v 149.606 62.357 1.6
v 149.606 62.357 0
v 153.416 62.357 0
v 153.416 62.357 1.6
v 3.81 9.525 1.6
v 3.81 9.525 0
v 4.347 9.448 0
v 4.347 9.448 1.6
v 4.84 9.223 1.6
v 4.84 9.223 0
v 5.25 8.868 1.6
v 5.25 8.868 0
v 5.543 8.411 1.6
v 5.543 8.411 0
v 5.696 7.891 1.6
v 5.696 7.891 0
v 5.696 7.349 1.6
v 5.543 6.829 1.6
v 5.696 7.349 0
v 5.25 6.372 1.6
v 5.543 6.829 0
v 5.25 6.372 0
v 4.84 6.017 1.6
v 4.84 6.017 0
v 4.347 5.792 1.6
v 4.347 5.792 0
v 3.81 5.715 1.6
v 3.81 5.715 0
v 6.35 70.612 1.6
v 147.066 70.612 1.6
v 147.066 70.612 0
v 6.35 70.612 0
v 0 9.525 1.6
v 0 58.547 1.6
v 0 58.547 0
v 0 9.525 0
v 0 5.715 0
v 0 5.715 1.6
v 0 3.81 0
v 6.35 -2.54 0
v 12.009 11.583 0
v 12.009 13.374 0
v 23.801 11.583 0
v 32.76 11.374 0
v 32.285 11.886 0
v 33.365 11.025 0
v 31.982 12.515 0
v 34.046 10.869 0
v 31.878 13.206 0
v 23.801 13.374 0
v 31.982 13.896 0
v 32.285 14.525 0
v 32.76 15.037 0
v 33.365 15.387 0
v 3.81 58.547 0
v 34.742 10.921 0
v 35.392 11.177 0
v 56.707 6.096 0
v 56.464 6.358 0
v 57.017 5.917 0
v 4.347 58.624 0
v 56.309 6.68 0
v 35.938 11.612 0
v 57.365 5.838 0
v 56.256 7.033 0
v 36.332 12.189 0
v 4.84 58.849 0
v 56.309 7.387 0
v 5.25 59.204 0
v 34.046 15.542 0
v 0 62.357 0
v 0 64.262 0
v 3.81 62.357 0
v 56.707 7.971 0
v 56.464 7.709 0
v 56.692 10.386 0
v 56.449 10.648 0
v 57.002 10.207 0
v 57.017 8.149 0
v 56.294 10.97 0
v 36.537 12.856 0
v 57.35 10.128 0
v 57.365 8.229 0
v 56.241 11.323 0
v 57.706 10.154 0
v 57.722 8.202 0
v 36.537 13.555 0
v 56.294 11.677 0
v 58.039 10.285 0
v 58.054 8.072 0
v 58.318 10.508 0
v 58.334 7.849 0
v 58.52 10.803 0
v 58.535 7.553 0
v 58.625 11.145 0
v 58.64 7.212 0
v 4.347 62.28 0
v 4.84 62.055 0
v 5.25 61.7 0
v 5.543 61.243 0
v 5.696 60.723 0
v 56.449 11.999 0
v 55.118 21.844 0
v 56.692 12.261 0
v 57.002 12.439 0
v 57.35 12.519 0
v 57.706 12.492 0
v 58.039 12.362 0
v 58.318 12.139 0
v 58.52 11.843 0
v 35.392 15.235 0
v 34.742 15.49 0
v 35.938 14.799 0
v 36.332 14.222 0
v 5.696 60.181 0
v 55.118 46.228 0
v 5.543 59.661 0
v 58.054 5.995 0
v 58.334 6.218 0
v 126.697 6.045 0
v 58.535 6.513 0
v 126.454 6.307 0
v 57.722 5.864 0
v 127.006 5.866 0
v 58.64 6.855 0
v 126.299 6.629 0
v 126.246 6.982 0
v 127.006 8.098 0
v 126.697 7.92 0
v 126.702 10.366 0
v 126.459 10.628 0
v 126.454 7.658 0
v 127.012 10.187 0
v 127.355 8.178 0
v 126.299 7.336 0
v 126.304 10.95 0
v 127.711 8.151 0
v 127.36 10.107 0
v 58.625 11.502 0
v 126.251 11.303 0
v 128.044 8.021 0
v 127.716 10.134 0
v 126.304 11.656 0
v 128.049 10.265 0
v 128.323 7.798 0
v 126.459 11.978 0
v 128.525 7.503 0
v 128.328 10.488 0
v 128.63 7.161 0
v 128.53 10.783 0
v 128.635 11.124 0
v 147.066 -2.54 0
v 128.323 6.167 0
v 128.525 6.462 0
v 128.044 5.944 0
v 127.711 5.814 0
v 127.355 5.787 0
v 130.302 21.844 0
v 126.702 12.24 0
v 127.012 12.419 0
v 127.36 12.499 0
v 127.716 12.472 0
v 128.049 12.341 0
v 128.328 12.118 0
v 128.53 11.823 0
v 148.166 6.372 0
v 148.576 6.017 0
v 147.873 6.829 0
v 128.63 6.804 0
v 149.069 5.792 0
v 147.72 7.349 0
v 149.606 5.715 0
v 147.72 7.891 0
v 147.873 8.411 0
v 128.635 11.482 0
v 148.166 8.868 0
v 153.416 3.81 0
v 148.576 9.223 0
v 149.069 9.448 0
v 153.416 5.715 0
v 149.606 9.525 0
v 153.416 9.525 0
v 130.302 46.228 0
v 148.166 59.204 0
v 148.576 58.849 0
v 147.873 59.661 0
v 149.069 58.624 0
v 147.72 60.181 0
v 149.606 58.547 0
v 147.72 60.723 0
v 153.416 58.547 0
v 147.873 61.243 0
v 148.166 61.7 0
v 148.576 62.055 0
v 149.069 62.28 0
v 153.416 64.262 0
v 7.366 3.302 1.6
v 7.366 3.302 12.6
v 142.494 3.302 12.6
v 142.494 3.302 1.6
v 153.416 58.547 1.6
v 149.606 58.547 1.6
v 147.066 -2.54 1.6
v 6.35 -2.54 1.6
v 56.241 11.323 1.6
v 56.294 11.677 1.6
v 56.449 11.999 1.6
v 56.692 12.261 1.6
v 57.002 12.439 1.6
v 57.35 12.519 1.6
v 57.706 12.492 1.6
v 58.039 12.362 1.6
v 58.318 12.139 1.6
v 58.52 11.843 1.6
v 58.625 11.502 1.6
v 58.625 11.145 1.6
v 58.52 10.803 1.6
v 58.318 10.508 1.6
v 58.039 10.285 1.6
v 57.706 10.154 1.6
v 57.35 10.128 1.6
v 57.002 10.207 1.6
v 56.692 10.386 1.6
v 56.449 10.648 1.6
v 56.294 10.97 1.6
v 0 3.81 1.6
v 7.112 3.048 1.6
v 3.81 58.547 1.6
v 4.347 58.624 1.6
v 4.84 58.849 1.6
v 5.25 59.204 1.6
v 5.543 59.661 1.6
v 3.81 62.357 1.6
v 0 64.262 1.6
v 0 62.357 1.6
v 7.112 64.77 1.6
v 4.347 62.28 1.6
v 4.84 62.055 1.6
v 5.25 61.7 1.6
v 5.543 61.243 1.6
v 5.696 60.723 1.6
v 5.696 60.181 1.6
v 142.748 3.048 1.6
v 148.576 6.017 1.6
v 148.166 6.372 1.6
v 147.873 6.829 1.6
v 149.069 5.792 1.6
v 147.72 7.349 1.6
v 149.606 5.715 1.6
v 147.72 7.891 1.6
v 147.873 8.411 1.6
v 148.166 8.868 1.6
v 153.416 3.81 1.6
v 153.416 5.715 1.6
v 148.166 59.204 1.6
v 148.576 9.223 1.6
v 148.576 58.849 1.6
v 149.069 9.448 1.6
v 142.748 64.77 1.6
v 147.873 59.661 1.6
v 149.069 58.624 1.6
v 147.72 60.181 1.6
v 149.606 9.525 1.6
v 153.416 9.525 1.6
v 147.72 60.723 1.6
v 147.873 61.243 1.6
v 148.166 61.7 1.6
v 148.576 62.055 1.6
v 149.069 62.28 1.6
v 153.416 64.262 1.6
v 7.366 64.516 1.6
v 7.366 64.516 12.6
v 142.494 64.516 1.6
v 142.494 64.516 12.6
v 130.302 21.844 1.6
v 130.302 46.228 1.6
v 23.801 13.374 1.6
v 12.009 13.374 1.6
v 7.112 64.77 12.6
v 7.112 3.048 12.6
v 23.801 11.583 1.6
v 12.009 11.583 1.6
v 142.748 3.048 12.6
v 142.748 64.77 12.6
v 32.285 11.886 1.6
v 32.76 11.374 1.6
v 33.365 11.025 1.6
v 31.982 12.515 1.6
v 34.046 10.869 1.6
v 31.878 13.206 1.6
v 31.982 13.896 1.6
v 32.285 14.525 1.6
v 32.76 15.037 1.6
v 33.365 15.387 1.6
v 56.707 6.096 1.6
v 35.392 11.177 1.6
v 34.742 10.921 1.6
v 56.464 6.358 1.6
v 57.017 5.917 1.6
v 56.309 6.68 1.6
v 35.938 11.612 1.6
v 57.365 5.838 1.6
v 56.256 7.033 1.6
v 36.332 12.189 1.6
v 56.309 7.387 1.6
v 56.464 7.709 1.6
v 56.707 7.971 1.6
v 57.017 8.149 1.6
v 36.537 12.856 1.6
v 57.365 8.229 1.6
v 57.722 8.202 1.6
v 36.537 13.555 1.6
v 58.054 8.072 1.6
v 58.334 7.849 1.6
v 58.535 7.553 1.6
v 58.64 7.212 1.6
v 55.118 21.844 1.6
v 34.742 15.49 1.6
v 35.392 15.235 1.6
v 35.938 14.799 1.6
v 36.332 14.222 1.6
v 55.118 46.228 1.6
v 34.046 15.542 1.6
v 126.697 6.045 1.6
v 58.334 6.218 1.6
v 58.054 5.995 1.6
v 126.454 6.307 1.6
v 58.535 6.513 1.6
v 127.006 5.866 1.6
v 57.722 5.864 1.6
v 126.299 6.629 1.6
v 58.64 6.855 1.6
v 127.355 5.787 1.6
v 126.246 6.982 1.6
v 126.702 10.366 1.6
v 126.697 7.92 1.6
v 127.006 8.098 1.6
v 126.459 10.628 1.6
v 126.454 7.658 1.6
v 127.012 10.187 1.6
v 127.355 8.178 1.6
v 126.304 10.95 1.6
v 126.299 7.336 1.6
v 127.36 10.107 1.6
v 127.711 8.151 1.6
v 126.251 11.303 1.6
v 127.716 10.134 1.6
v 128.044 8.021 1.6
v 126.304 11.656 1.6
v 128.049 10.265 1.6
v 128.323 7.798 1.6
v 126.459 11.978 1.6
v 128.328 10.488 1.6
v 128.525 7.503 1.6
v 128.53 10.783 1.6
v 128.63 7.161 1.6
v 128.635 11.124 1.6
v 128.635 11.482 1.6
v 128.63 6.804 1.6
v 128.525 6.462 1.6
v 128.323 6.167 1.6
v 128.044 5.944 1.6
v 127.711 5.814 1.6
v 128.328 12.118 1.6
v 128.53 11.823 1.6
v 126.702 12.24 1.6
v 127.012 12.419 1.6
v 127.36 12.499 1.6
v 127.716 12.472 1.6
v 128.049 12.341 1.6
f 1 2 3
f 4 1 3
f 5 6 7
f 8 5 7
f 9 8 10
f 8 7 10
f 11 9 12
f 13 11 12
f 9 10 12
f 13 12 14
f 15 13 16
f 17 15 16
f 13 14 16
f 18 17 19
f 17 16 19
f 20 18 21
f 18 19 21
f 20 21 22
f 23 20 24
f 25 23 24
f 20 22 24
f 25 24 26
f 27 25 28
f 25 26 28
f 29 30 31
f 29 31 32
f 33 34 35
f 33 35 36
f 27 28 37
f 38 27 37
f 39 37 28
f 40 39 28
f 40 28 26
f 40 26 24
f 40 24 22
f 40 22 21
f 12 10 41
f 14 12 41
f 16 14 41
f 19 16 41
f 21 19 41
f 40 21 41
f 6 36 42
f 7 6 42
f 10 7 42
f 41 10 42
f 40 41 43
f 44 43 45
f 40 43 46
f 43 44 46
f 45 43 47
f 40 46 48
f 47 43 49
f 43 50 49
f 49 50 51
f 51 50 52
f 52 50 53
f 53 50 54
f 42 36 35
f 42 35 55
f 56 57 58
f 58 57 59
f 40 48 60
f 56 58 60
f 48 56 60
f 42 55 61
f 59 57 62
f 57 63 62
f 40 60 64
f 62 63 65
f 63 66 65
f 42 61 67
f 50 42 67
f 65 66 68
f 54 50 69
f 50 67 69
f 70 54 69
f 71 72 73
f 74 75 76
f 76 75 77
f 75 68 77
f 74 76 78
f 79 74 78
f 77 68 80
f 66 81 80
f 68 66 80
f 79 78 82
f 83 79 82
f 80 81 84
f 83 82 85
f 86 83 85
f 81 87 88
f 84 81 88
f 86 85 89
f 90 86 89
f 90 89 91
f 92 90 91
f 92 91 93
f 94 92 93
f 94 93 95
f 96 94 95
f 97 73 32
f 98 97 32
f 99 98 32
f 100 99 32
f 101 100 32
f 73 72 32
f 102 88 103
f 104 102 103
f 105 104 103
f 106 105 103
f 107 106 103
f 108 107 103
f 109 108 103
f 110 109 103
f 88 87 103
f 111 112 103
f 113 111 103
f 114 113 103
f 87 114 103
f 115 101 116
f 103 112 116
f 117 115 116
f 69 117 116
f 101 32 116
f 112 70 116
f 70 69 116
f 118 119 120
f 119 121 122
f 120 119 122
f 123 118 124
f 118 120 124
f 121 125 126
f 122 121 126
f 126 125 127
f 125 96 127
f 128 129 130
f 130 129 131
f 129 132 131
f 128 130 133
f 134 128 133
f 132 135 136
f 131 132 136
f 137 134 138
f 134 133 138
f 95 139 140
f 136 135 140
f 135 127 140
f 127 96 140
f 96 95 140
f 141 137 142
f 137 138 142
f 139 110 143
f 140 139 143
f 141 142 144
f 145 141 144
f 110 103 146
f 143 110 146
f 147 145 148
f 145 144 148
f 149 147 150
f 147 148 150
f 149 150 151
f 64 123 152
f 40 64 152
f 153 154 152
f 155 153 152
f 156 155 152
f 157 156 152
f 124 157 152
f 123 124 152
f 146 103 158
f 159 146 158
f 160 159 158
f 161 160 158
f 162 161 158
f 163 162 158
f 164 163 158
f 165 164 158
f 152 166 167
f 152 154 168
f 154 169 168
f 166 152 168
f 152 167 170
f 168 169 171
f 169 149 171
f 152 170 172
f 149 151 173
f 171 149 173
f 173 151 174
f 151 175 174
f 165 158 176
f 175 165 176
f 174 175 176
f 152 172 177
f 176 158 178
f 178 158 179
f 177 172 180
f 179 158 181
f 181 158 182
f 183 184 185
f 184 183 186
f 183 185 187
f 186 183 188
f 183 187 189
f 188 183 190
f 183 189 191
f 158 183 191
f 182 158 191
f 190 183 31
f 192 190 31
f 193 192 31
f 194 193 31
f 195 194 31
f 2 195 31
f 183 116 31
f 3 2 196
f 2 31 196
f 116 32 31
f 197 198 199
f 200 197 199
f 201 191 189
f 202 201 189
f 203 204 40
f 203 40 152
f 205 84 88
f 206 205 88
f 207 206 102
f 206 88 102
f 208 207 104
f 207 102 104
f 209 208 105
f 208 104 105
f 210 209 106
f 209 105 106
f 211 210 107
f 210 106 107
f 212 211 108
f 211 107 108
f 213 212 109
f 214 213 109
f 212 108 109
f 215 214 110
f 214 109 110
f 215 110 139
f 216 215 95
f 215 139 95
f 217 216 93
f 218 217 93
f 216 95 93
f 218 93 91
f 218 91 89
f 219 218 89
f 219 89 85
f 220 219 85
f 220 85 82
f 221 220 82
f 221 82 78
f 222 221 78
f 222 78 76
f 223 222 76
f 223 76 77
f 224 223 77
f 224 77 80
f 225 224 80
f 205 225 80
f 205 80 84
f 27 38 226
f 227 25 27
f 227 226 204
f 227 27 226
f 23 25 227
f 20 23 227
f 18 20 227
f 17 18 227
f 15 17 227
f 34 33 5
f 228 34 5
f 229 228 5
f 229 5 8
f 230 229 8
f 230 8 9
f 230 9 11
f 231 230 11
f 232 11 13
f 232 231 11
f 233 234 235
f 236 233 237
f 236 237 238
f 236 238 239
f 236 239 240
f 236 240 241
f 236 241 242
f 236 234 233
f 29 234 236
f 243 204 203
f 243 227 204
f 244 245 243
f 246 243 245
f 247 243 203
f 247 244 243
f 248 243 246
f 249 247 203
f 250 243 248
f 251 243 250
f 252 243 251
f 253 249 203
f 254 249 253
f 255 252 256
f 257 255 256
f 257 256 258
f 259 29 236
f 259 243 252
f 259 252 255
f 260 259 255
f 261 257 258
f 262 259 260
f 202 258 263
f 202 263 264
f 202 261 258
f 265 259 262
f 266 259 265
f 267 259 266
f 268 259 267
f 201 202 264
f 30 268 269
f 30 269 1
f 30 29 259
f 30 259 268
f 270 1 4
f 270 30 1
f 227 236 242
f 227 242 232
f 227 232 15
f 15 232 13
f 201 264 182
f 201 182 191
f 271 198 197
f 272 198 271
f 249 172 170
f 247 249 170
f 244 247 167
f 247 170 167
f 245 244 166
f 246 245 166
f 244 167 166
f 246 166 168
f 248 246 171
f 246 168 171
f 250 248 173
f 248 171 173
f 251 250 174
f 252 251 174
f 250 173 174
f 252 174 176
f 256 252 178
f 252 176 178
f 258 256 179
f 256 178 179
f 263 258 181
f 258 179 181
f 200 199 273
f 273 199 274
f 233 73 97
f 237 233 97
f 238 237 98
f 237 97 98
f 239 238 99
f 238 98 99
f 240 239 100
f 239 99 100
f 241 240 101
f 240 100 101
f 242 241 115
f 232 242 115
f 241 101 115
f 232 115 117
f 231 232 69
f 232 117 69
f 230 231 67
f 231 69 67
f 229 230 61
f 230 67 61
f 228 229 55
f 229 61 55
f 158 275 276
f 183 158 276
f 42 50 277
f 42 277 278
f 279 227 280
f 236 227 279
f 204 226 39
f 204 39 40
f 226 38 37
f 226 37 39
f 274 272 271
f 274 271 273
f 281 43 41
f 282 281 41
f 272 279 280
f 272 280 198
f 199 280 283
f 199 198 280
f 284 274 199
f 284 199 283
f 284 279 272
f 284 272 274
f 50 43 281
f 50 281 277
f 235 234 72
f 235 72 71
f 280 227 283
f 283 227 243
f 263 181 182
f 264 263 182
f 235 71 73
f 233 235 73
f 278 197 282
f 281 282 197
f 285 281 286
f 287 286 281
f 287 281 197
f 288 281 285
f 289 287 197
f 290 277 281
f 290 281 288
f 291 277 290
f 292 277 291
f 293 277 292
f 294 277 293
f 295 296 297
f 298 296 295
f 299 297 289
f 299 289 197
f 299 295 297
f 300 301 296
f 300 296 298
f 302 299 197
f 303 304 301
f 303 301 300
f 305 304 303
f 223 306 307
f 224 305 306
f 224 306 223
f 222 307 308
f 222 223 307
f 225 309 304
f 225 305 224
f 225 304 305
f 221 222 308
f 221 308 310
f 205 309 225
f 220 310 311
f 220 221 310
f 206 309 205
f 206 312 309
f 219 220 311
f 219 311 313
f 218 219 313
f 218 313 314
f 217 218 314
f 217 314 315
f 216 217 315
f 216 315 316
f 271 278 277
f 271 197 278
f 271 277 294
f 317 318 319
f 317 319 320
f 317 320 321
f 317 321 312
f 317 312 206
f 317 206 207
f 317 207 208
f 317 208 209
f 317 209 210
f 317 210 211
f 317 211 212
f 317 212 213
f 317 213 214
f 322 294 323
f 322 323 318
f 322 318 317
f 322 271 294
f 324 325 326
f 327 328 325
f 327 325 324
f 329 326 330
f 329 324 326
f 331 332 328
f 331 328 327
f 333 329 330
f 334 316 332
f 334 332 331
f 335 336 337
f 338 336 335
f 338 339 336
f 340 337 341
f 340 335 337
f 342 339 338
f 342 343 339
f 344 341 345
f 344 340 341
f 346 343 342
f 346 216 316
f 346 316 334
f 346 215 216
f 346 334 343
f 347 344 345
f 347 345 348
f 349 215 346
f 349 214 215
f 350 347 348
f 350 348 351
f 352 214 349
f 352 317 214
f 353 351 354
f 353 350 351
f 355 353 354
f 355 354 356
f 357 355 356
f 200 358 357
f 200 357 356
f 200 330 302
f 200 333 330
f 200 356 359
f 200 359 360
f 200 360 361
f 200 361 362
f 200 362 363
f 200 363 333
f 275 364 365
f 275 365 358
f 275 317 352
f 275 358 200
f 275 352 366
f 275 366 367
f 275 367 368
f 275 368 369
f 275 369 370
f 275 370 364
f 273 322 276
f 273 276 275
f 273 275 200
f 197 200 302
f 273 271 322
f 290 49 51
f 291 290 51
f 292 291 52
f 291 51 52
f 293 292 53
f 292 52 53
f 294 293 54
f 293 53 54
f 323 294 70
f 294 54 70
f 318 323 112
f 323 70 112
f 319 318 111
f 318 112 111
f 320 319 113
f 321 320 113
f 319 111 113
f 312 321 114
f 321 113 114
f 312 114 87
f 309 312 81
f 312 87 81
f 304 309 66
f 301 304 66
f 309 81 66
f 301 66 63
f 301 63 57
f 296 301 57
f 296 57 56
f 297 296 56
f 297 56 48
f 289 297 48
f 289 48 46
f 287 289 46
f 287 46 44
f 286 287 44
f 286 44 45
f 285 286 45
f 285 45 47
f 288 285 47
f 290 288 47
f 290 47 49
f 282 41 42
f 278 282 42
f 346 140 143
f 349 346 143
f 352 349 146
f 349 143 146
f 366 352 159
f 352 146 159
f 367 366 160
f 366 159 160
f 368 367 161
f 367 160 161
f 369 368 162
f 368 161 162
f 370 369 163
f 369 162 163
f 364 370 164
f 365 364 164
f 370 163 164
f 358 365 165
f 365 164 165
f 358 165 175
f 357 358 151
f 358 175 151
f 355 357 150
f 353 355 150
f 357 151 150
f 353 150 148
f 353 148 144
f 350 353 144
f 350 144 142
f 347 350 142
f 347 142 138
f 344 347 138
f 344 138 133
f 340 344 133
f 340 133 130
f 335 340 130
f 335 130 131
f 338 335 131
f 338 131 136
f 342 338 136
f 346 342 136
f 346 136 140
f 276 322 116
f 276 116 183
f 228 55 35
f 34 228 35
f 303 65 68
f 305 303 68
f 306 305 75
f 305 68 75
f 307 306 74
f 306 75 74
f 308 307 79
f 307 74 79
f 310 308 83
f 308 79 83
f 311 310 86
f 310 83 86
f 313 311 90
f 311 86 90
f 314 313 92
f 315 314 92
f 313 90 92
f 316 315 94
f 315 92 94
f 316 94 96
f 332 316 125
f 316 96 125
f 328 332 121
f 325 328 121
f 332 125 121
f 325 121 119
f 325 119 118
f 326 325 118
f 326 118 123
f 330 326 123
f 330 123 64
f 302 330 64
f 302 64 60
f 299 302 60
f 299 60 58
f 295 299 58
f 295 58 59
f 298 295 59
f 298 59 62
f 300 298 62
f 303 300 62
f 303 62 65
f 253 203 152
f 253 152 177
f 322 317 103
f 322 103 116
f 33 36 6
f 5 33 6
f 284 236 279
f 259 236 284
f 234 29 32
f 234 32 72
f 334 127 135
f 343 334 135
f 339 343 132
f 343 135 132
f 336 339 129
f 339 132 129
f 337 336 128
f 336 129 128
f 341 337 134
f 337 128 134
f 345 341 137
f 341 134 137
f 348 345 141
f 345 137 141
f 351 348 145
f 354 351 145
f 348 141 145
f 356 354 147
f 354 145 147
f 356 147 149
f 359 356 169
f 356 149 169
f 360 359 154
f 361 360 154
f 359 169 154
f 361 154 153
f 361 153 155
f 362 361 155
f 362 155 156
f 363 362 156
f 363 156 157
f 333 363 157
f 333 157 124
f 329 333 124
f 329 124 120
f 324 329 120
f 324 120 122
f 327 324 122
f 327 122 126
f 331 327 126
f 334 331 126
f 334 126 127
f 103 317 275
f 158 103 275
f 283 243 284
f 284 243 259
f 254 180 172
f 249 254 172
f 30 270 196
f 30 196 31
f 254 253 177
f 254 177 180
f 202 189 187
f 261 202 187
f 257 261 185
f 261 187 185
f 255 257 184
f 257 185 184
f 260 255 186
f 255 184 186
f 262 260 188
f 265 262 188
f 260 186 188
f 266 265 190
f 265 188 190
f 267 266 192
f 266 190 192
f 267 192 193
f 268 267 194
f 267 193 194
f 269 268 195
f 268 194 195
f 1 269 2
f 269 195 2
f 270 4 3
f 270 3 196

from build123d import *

# Parameters (mm, degrees)
BOSS_EXTRUDE1_DEPTH      = 1.6002
CUT_EXTRUDE1_DEPTH       = 2.6002
CUT_EXTRUDE2_DEPTH       = 2.6002
CUT_EXTRUDE3_DEPTH       = 2.6002
CUT_EXTRUDE4_DEPTH       = 2.6002
SKETCH6_W                = 135.636
SKETCH6_H                = 61.722
BOSS_EXTRUDE2_DEPTH      = 11
SKETCH7_W                = 135.128
SKETCH7_H                = 61.214
CUT_EXTRUDE5_DEPTH       = 11
SKETCH8_W                = 75.184
SKETCH8_H                = 24.384
CUT_EXTRUDE6_DEPTH       = 2.6002
SKETCH9_W                = 11.792676588
SKETCH9_H                = 1.790289347
CUT_EXTRUDE7_DEPTH       = 13.6002
M2_CLEARANCE_HOLE1_D     = 2.39776
M2_CLEARANCE_HOLE1_DEPTH = 1.6002
M4_CLEARANCE_HOLE2_D     = 4.68589235
M4_CLEARANCE_HOLE2_DEPTH = 1.6002


with BuildPart() as part:
    # Sketch1 → Boss-Extrude1 (new body)
    with BuildSketch(Plane.XY.offset(1.6002)):
        Polygon((6.35, 70.612), (0, 64.262), (0, 3.81), (6.35, -2.54), (147.066, -2.54), (153.416, 3.81), (153.416, 64.262), (147.066, 70.612), align=None)
    extrude(amount=-BOSS_EXTRUDE1_DEPTH)

    # Sketch2 → Cut-Extrude1 (cut, through all)
    with BuildSketch(Plane(origin=(0, 0, 0), x_dir=(-1, 0, 0), z_dir=(0, 0, -1))):
        with BuildLine():
            Line((-153.416, 9.525), (-153.416, 5.715))
            Line((-153.416, 5.715), (-149.606, 5.715))
            ThreePointArc((-149.606, 5.715), (-147.701, 7.62), (-149.606, 9.525))
            Line((-149.606, 9.525), (-153.416, 9.525))
        make_face()
    extrude(amount=-CUT_EXTRUDE1_DEPTH, mode=Mode.SUBTRACT)

    # Sketch3 → Cut-Extrude2 (cut, through all)
    with BuildSketch(Plane(origin=(0, 0, 0), x_dir=(-1, 0, 0), z_dir=(0, 0, -1))):
        with BuildLine():
            Line((-153.416, 62.357), (-153.416, 58.547))
            Line((-153.416, 58.547), (-149.606, 58.547))
            ThreePointArc((-149.606, 58.547), (-147.701, 60.452), (-149.606, 62.357))
            Line((-149.606, 62.357), (-153.416, 62.357))
        make_face()
    extrude(amount=-CUT_EXTRUDE2_DEPTH, mode=Mode.SUBTRACT)

    # Sketch4 → Cut-Extrude3 (cut, through all)
    with BuildSketch(Plane(origin=(0, 0, 0), x_dir=(-1, 0, 0), z_dir=(0, 0, -1))):
        with BuildLine():
            Line((0, 58.547), (0, 62.357))
            Line((0, 62.357), (-3.81, 62.357))
            ThreePointArc((-3.81, 62.357), (-5.715, 60.452), (-3.81, 58.547))
            Line((-3.81, 58.547), (0, 58.547))
        make_face()
    extrude(amount=-CUT_EXTRUDE3_DEPTH, mode=Mode.SUBTRACT)

    # Sketch5 → Cut-Extrude4 (cut, through all)
    with BuildSketch(Plane(origin=(0, 0, 0), x_dir=(-1, 0, 0), z_dir=(0, 0, -1))):
        with BuildLine():
            Line((0, 5.715), (0, 9.525))
            Line((0, 9.525), (-3.81, 9.525))
            ThreePointArc((-3.81, 9.525), (-5.715, 7.62), (-3.81, 5.715))
            Line((-3.81, 5.715), (0, 5.715))
        make_face()
    extrude(amount=-CUT_EXTRUDE4_DEPTH, mode=Mode.SUBTRACT)

    # Sketch6 → Boss-Extrude2 (add)
    with BuildSketch(Plane.XY.offset(1.6002)):
        with Locations((74.93, 33.909)):
            Rectangle(SKETCH6_W, SKETCH6_H)
    extrude(amount=BOSS_EXTRUDE2_DEPTH)

    # Sketch7 → Cut-Extrude5 (cut)
    with BuildSketch(Plane.XY.offset(12.6002)):
        with Locations((74.93, 33.909)):
            Rectangle(SKETCH7_W, SKETCH7_H)
    extrude(amount=-CUT_EXTRUDE5_DEPTH, mode=Mode.SUBTRACT)

    # Sketch8 → Cut-Extrude6 (cut, through all)
    with BuildSketch(Plane.XY.offset(1.6002)):
        with Locations((92.71, 34.036)):
            Rectangle(SKETCH8_W, SKETCH8_H)
    extrude(amount=-CUT_EXTRUDE6_DEPTH, mode=Mode.SUBTRACT)

    # Sketch9 → Cut-Extrude7 (cut, through all)
    with BuildSketch(Plane(origin=(0, 0, 0), x_dir=(-1, 0, 0), z_dir=(0, 0, -1))):
        with Locations((-17.905053156, 12.47860787)):
            Rectangle(SKETCH9_W, SKETCH9_H)
    extrude(amount=-CUT_EXTRUDE7_DEPTH, mode=Mode.SUBTRACT)

    # M2 Clearance Hole1
    with Locations(Plane.XY.offset(1.6002)):
        with Locations((127.4445, 6.98246), (127.44958, 11.303), (57.4548, 7.03326), (57.43956, 11.32332)):
            Hole(M2_CLEARANCE_HOLE1_D / 2, depth=M2_CLEARANCE_HOLE1_DEPTH)

    # M4 Clearance Hole2
    with Locations(Plane.XY.offset(1.6002)):
        with Locations((34.22065157, 13.205568935)):
            Hole(M4_CLEARANCE_HOLE2_D / 2, depth=M4_CLEARANCE_HOLE2_DEPTH)


solid = part.part
